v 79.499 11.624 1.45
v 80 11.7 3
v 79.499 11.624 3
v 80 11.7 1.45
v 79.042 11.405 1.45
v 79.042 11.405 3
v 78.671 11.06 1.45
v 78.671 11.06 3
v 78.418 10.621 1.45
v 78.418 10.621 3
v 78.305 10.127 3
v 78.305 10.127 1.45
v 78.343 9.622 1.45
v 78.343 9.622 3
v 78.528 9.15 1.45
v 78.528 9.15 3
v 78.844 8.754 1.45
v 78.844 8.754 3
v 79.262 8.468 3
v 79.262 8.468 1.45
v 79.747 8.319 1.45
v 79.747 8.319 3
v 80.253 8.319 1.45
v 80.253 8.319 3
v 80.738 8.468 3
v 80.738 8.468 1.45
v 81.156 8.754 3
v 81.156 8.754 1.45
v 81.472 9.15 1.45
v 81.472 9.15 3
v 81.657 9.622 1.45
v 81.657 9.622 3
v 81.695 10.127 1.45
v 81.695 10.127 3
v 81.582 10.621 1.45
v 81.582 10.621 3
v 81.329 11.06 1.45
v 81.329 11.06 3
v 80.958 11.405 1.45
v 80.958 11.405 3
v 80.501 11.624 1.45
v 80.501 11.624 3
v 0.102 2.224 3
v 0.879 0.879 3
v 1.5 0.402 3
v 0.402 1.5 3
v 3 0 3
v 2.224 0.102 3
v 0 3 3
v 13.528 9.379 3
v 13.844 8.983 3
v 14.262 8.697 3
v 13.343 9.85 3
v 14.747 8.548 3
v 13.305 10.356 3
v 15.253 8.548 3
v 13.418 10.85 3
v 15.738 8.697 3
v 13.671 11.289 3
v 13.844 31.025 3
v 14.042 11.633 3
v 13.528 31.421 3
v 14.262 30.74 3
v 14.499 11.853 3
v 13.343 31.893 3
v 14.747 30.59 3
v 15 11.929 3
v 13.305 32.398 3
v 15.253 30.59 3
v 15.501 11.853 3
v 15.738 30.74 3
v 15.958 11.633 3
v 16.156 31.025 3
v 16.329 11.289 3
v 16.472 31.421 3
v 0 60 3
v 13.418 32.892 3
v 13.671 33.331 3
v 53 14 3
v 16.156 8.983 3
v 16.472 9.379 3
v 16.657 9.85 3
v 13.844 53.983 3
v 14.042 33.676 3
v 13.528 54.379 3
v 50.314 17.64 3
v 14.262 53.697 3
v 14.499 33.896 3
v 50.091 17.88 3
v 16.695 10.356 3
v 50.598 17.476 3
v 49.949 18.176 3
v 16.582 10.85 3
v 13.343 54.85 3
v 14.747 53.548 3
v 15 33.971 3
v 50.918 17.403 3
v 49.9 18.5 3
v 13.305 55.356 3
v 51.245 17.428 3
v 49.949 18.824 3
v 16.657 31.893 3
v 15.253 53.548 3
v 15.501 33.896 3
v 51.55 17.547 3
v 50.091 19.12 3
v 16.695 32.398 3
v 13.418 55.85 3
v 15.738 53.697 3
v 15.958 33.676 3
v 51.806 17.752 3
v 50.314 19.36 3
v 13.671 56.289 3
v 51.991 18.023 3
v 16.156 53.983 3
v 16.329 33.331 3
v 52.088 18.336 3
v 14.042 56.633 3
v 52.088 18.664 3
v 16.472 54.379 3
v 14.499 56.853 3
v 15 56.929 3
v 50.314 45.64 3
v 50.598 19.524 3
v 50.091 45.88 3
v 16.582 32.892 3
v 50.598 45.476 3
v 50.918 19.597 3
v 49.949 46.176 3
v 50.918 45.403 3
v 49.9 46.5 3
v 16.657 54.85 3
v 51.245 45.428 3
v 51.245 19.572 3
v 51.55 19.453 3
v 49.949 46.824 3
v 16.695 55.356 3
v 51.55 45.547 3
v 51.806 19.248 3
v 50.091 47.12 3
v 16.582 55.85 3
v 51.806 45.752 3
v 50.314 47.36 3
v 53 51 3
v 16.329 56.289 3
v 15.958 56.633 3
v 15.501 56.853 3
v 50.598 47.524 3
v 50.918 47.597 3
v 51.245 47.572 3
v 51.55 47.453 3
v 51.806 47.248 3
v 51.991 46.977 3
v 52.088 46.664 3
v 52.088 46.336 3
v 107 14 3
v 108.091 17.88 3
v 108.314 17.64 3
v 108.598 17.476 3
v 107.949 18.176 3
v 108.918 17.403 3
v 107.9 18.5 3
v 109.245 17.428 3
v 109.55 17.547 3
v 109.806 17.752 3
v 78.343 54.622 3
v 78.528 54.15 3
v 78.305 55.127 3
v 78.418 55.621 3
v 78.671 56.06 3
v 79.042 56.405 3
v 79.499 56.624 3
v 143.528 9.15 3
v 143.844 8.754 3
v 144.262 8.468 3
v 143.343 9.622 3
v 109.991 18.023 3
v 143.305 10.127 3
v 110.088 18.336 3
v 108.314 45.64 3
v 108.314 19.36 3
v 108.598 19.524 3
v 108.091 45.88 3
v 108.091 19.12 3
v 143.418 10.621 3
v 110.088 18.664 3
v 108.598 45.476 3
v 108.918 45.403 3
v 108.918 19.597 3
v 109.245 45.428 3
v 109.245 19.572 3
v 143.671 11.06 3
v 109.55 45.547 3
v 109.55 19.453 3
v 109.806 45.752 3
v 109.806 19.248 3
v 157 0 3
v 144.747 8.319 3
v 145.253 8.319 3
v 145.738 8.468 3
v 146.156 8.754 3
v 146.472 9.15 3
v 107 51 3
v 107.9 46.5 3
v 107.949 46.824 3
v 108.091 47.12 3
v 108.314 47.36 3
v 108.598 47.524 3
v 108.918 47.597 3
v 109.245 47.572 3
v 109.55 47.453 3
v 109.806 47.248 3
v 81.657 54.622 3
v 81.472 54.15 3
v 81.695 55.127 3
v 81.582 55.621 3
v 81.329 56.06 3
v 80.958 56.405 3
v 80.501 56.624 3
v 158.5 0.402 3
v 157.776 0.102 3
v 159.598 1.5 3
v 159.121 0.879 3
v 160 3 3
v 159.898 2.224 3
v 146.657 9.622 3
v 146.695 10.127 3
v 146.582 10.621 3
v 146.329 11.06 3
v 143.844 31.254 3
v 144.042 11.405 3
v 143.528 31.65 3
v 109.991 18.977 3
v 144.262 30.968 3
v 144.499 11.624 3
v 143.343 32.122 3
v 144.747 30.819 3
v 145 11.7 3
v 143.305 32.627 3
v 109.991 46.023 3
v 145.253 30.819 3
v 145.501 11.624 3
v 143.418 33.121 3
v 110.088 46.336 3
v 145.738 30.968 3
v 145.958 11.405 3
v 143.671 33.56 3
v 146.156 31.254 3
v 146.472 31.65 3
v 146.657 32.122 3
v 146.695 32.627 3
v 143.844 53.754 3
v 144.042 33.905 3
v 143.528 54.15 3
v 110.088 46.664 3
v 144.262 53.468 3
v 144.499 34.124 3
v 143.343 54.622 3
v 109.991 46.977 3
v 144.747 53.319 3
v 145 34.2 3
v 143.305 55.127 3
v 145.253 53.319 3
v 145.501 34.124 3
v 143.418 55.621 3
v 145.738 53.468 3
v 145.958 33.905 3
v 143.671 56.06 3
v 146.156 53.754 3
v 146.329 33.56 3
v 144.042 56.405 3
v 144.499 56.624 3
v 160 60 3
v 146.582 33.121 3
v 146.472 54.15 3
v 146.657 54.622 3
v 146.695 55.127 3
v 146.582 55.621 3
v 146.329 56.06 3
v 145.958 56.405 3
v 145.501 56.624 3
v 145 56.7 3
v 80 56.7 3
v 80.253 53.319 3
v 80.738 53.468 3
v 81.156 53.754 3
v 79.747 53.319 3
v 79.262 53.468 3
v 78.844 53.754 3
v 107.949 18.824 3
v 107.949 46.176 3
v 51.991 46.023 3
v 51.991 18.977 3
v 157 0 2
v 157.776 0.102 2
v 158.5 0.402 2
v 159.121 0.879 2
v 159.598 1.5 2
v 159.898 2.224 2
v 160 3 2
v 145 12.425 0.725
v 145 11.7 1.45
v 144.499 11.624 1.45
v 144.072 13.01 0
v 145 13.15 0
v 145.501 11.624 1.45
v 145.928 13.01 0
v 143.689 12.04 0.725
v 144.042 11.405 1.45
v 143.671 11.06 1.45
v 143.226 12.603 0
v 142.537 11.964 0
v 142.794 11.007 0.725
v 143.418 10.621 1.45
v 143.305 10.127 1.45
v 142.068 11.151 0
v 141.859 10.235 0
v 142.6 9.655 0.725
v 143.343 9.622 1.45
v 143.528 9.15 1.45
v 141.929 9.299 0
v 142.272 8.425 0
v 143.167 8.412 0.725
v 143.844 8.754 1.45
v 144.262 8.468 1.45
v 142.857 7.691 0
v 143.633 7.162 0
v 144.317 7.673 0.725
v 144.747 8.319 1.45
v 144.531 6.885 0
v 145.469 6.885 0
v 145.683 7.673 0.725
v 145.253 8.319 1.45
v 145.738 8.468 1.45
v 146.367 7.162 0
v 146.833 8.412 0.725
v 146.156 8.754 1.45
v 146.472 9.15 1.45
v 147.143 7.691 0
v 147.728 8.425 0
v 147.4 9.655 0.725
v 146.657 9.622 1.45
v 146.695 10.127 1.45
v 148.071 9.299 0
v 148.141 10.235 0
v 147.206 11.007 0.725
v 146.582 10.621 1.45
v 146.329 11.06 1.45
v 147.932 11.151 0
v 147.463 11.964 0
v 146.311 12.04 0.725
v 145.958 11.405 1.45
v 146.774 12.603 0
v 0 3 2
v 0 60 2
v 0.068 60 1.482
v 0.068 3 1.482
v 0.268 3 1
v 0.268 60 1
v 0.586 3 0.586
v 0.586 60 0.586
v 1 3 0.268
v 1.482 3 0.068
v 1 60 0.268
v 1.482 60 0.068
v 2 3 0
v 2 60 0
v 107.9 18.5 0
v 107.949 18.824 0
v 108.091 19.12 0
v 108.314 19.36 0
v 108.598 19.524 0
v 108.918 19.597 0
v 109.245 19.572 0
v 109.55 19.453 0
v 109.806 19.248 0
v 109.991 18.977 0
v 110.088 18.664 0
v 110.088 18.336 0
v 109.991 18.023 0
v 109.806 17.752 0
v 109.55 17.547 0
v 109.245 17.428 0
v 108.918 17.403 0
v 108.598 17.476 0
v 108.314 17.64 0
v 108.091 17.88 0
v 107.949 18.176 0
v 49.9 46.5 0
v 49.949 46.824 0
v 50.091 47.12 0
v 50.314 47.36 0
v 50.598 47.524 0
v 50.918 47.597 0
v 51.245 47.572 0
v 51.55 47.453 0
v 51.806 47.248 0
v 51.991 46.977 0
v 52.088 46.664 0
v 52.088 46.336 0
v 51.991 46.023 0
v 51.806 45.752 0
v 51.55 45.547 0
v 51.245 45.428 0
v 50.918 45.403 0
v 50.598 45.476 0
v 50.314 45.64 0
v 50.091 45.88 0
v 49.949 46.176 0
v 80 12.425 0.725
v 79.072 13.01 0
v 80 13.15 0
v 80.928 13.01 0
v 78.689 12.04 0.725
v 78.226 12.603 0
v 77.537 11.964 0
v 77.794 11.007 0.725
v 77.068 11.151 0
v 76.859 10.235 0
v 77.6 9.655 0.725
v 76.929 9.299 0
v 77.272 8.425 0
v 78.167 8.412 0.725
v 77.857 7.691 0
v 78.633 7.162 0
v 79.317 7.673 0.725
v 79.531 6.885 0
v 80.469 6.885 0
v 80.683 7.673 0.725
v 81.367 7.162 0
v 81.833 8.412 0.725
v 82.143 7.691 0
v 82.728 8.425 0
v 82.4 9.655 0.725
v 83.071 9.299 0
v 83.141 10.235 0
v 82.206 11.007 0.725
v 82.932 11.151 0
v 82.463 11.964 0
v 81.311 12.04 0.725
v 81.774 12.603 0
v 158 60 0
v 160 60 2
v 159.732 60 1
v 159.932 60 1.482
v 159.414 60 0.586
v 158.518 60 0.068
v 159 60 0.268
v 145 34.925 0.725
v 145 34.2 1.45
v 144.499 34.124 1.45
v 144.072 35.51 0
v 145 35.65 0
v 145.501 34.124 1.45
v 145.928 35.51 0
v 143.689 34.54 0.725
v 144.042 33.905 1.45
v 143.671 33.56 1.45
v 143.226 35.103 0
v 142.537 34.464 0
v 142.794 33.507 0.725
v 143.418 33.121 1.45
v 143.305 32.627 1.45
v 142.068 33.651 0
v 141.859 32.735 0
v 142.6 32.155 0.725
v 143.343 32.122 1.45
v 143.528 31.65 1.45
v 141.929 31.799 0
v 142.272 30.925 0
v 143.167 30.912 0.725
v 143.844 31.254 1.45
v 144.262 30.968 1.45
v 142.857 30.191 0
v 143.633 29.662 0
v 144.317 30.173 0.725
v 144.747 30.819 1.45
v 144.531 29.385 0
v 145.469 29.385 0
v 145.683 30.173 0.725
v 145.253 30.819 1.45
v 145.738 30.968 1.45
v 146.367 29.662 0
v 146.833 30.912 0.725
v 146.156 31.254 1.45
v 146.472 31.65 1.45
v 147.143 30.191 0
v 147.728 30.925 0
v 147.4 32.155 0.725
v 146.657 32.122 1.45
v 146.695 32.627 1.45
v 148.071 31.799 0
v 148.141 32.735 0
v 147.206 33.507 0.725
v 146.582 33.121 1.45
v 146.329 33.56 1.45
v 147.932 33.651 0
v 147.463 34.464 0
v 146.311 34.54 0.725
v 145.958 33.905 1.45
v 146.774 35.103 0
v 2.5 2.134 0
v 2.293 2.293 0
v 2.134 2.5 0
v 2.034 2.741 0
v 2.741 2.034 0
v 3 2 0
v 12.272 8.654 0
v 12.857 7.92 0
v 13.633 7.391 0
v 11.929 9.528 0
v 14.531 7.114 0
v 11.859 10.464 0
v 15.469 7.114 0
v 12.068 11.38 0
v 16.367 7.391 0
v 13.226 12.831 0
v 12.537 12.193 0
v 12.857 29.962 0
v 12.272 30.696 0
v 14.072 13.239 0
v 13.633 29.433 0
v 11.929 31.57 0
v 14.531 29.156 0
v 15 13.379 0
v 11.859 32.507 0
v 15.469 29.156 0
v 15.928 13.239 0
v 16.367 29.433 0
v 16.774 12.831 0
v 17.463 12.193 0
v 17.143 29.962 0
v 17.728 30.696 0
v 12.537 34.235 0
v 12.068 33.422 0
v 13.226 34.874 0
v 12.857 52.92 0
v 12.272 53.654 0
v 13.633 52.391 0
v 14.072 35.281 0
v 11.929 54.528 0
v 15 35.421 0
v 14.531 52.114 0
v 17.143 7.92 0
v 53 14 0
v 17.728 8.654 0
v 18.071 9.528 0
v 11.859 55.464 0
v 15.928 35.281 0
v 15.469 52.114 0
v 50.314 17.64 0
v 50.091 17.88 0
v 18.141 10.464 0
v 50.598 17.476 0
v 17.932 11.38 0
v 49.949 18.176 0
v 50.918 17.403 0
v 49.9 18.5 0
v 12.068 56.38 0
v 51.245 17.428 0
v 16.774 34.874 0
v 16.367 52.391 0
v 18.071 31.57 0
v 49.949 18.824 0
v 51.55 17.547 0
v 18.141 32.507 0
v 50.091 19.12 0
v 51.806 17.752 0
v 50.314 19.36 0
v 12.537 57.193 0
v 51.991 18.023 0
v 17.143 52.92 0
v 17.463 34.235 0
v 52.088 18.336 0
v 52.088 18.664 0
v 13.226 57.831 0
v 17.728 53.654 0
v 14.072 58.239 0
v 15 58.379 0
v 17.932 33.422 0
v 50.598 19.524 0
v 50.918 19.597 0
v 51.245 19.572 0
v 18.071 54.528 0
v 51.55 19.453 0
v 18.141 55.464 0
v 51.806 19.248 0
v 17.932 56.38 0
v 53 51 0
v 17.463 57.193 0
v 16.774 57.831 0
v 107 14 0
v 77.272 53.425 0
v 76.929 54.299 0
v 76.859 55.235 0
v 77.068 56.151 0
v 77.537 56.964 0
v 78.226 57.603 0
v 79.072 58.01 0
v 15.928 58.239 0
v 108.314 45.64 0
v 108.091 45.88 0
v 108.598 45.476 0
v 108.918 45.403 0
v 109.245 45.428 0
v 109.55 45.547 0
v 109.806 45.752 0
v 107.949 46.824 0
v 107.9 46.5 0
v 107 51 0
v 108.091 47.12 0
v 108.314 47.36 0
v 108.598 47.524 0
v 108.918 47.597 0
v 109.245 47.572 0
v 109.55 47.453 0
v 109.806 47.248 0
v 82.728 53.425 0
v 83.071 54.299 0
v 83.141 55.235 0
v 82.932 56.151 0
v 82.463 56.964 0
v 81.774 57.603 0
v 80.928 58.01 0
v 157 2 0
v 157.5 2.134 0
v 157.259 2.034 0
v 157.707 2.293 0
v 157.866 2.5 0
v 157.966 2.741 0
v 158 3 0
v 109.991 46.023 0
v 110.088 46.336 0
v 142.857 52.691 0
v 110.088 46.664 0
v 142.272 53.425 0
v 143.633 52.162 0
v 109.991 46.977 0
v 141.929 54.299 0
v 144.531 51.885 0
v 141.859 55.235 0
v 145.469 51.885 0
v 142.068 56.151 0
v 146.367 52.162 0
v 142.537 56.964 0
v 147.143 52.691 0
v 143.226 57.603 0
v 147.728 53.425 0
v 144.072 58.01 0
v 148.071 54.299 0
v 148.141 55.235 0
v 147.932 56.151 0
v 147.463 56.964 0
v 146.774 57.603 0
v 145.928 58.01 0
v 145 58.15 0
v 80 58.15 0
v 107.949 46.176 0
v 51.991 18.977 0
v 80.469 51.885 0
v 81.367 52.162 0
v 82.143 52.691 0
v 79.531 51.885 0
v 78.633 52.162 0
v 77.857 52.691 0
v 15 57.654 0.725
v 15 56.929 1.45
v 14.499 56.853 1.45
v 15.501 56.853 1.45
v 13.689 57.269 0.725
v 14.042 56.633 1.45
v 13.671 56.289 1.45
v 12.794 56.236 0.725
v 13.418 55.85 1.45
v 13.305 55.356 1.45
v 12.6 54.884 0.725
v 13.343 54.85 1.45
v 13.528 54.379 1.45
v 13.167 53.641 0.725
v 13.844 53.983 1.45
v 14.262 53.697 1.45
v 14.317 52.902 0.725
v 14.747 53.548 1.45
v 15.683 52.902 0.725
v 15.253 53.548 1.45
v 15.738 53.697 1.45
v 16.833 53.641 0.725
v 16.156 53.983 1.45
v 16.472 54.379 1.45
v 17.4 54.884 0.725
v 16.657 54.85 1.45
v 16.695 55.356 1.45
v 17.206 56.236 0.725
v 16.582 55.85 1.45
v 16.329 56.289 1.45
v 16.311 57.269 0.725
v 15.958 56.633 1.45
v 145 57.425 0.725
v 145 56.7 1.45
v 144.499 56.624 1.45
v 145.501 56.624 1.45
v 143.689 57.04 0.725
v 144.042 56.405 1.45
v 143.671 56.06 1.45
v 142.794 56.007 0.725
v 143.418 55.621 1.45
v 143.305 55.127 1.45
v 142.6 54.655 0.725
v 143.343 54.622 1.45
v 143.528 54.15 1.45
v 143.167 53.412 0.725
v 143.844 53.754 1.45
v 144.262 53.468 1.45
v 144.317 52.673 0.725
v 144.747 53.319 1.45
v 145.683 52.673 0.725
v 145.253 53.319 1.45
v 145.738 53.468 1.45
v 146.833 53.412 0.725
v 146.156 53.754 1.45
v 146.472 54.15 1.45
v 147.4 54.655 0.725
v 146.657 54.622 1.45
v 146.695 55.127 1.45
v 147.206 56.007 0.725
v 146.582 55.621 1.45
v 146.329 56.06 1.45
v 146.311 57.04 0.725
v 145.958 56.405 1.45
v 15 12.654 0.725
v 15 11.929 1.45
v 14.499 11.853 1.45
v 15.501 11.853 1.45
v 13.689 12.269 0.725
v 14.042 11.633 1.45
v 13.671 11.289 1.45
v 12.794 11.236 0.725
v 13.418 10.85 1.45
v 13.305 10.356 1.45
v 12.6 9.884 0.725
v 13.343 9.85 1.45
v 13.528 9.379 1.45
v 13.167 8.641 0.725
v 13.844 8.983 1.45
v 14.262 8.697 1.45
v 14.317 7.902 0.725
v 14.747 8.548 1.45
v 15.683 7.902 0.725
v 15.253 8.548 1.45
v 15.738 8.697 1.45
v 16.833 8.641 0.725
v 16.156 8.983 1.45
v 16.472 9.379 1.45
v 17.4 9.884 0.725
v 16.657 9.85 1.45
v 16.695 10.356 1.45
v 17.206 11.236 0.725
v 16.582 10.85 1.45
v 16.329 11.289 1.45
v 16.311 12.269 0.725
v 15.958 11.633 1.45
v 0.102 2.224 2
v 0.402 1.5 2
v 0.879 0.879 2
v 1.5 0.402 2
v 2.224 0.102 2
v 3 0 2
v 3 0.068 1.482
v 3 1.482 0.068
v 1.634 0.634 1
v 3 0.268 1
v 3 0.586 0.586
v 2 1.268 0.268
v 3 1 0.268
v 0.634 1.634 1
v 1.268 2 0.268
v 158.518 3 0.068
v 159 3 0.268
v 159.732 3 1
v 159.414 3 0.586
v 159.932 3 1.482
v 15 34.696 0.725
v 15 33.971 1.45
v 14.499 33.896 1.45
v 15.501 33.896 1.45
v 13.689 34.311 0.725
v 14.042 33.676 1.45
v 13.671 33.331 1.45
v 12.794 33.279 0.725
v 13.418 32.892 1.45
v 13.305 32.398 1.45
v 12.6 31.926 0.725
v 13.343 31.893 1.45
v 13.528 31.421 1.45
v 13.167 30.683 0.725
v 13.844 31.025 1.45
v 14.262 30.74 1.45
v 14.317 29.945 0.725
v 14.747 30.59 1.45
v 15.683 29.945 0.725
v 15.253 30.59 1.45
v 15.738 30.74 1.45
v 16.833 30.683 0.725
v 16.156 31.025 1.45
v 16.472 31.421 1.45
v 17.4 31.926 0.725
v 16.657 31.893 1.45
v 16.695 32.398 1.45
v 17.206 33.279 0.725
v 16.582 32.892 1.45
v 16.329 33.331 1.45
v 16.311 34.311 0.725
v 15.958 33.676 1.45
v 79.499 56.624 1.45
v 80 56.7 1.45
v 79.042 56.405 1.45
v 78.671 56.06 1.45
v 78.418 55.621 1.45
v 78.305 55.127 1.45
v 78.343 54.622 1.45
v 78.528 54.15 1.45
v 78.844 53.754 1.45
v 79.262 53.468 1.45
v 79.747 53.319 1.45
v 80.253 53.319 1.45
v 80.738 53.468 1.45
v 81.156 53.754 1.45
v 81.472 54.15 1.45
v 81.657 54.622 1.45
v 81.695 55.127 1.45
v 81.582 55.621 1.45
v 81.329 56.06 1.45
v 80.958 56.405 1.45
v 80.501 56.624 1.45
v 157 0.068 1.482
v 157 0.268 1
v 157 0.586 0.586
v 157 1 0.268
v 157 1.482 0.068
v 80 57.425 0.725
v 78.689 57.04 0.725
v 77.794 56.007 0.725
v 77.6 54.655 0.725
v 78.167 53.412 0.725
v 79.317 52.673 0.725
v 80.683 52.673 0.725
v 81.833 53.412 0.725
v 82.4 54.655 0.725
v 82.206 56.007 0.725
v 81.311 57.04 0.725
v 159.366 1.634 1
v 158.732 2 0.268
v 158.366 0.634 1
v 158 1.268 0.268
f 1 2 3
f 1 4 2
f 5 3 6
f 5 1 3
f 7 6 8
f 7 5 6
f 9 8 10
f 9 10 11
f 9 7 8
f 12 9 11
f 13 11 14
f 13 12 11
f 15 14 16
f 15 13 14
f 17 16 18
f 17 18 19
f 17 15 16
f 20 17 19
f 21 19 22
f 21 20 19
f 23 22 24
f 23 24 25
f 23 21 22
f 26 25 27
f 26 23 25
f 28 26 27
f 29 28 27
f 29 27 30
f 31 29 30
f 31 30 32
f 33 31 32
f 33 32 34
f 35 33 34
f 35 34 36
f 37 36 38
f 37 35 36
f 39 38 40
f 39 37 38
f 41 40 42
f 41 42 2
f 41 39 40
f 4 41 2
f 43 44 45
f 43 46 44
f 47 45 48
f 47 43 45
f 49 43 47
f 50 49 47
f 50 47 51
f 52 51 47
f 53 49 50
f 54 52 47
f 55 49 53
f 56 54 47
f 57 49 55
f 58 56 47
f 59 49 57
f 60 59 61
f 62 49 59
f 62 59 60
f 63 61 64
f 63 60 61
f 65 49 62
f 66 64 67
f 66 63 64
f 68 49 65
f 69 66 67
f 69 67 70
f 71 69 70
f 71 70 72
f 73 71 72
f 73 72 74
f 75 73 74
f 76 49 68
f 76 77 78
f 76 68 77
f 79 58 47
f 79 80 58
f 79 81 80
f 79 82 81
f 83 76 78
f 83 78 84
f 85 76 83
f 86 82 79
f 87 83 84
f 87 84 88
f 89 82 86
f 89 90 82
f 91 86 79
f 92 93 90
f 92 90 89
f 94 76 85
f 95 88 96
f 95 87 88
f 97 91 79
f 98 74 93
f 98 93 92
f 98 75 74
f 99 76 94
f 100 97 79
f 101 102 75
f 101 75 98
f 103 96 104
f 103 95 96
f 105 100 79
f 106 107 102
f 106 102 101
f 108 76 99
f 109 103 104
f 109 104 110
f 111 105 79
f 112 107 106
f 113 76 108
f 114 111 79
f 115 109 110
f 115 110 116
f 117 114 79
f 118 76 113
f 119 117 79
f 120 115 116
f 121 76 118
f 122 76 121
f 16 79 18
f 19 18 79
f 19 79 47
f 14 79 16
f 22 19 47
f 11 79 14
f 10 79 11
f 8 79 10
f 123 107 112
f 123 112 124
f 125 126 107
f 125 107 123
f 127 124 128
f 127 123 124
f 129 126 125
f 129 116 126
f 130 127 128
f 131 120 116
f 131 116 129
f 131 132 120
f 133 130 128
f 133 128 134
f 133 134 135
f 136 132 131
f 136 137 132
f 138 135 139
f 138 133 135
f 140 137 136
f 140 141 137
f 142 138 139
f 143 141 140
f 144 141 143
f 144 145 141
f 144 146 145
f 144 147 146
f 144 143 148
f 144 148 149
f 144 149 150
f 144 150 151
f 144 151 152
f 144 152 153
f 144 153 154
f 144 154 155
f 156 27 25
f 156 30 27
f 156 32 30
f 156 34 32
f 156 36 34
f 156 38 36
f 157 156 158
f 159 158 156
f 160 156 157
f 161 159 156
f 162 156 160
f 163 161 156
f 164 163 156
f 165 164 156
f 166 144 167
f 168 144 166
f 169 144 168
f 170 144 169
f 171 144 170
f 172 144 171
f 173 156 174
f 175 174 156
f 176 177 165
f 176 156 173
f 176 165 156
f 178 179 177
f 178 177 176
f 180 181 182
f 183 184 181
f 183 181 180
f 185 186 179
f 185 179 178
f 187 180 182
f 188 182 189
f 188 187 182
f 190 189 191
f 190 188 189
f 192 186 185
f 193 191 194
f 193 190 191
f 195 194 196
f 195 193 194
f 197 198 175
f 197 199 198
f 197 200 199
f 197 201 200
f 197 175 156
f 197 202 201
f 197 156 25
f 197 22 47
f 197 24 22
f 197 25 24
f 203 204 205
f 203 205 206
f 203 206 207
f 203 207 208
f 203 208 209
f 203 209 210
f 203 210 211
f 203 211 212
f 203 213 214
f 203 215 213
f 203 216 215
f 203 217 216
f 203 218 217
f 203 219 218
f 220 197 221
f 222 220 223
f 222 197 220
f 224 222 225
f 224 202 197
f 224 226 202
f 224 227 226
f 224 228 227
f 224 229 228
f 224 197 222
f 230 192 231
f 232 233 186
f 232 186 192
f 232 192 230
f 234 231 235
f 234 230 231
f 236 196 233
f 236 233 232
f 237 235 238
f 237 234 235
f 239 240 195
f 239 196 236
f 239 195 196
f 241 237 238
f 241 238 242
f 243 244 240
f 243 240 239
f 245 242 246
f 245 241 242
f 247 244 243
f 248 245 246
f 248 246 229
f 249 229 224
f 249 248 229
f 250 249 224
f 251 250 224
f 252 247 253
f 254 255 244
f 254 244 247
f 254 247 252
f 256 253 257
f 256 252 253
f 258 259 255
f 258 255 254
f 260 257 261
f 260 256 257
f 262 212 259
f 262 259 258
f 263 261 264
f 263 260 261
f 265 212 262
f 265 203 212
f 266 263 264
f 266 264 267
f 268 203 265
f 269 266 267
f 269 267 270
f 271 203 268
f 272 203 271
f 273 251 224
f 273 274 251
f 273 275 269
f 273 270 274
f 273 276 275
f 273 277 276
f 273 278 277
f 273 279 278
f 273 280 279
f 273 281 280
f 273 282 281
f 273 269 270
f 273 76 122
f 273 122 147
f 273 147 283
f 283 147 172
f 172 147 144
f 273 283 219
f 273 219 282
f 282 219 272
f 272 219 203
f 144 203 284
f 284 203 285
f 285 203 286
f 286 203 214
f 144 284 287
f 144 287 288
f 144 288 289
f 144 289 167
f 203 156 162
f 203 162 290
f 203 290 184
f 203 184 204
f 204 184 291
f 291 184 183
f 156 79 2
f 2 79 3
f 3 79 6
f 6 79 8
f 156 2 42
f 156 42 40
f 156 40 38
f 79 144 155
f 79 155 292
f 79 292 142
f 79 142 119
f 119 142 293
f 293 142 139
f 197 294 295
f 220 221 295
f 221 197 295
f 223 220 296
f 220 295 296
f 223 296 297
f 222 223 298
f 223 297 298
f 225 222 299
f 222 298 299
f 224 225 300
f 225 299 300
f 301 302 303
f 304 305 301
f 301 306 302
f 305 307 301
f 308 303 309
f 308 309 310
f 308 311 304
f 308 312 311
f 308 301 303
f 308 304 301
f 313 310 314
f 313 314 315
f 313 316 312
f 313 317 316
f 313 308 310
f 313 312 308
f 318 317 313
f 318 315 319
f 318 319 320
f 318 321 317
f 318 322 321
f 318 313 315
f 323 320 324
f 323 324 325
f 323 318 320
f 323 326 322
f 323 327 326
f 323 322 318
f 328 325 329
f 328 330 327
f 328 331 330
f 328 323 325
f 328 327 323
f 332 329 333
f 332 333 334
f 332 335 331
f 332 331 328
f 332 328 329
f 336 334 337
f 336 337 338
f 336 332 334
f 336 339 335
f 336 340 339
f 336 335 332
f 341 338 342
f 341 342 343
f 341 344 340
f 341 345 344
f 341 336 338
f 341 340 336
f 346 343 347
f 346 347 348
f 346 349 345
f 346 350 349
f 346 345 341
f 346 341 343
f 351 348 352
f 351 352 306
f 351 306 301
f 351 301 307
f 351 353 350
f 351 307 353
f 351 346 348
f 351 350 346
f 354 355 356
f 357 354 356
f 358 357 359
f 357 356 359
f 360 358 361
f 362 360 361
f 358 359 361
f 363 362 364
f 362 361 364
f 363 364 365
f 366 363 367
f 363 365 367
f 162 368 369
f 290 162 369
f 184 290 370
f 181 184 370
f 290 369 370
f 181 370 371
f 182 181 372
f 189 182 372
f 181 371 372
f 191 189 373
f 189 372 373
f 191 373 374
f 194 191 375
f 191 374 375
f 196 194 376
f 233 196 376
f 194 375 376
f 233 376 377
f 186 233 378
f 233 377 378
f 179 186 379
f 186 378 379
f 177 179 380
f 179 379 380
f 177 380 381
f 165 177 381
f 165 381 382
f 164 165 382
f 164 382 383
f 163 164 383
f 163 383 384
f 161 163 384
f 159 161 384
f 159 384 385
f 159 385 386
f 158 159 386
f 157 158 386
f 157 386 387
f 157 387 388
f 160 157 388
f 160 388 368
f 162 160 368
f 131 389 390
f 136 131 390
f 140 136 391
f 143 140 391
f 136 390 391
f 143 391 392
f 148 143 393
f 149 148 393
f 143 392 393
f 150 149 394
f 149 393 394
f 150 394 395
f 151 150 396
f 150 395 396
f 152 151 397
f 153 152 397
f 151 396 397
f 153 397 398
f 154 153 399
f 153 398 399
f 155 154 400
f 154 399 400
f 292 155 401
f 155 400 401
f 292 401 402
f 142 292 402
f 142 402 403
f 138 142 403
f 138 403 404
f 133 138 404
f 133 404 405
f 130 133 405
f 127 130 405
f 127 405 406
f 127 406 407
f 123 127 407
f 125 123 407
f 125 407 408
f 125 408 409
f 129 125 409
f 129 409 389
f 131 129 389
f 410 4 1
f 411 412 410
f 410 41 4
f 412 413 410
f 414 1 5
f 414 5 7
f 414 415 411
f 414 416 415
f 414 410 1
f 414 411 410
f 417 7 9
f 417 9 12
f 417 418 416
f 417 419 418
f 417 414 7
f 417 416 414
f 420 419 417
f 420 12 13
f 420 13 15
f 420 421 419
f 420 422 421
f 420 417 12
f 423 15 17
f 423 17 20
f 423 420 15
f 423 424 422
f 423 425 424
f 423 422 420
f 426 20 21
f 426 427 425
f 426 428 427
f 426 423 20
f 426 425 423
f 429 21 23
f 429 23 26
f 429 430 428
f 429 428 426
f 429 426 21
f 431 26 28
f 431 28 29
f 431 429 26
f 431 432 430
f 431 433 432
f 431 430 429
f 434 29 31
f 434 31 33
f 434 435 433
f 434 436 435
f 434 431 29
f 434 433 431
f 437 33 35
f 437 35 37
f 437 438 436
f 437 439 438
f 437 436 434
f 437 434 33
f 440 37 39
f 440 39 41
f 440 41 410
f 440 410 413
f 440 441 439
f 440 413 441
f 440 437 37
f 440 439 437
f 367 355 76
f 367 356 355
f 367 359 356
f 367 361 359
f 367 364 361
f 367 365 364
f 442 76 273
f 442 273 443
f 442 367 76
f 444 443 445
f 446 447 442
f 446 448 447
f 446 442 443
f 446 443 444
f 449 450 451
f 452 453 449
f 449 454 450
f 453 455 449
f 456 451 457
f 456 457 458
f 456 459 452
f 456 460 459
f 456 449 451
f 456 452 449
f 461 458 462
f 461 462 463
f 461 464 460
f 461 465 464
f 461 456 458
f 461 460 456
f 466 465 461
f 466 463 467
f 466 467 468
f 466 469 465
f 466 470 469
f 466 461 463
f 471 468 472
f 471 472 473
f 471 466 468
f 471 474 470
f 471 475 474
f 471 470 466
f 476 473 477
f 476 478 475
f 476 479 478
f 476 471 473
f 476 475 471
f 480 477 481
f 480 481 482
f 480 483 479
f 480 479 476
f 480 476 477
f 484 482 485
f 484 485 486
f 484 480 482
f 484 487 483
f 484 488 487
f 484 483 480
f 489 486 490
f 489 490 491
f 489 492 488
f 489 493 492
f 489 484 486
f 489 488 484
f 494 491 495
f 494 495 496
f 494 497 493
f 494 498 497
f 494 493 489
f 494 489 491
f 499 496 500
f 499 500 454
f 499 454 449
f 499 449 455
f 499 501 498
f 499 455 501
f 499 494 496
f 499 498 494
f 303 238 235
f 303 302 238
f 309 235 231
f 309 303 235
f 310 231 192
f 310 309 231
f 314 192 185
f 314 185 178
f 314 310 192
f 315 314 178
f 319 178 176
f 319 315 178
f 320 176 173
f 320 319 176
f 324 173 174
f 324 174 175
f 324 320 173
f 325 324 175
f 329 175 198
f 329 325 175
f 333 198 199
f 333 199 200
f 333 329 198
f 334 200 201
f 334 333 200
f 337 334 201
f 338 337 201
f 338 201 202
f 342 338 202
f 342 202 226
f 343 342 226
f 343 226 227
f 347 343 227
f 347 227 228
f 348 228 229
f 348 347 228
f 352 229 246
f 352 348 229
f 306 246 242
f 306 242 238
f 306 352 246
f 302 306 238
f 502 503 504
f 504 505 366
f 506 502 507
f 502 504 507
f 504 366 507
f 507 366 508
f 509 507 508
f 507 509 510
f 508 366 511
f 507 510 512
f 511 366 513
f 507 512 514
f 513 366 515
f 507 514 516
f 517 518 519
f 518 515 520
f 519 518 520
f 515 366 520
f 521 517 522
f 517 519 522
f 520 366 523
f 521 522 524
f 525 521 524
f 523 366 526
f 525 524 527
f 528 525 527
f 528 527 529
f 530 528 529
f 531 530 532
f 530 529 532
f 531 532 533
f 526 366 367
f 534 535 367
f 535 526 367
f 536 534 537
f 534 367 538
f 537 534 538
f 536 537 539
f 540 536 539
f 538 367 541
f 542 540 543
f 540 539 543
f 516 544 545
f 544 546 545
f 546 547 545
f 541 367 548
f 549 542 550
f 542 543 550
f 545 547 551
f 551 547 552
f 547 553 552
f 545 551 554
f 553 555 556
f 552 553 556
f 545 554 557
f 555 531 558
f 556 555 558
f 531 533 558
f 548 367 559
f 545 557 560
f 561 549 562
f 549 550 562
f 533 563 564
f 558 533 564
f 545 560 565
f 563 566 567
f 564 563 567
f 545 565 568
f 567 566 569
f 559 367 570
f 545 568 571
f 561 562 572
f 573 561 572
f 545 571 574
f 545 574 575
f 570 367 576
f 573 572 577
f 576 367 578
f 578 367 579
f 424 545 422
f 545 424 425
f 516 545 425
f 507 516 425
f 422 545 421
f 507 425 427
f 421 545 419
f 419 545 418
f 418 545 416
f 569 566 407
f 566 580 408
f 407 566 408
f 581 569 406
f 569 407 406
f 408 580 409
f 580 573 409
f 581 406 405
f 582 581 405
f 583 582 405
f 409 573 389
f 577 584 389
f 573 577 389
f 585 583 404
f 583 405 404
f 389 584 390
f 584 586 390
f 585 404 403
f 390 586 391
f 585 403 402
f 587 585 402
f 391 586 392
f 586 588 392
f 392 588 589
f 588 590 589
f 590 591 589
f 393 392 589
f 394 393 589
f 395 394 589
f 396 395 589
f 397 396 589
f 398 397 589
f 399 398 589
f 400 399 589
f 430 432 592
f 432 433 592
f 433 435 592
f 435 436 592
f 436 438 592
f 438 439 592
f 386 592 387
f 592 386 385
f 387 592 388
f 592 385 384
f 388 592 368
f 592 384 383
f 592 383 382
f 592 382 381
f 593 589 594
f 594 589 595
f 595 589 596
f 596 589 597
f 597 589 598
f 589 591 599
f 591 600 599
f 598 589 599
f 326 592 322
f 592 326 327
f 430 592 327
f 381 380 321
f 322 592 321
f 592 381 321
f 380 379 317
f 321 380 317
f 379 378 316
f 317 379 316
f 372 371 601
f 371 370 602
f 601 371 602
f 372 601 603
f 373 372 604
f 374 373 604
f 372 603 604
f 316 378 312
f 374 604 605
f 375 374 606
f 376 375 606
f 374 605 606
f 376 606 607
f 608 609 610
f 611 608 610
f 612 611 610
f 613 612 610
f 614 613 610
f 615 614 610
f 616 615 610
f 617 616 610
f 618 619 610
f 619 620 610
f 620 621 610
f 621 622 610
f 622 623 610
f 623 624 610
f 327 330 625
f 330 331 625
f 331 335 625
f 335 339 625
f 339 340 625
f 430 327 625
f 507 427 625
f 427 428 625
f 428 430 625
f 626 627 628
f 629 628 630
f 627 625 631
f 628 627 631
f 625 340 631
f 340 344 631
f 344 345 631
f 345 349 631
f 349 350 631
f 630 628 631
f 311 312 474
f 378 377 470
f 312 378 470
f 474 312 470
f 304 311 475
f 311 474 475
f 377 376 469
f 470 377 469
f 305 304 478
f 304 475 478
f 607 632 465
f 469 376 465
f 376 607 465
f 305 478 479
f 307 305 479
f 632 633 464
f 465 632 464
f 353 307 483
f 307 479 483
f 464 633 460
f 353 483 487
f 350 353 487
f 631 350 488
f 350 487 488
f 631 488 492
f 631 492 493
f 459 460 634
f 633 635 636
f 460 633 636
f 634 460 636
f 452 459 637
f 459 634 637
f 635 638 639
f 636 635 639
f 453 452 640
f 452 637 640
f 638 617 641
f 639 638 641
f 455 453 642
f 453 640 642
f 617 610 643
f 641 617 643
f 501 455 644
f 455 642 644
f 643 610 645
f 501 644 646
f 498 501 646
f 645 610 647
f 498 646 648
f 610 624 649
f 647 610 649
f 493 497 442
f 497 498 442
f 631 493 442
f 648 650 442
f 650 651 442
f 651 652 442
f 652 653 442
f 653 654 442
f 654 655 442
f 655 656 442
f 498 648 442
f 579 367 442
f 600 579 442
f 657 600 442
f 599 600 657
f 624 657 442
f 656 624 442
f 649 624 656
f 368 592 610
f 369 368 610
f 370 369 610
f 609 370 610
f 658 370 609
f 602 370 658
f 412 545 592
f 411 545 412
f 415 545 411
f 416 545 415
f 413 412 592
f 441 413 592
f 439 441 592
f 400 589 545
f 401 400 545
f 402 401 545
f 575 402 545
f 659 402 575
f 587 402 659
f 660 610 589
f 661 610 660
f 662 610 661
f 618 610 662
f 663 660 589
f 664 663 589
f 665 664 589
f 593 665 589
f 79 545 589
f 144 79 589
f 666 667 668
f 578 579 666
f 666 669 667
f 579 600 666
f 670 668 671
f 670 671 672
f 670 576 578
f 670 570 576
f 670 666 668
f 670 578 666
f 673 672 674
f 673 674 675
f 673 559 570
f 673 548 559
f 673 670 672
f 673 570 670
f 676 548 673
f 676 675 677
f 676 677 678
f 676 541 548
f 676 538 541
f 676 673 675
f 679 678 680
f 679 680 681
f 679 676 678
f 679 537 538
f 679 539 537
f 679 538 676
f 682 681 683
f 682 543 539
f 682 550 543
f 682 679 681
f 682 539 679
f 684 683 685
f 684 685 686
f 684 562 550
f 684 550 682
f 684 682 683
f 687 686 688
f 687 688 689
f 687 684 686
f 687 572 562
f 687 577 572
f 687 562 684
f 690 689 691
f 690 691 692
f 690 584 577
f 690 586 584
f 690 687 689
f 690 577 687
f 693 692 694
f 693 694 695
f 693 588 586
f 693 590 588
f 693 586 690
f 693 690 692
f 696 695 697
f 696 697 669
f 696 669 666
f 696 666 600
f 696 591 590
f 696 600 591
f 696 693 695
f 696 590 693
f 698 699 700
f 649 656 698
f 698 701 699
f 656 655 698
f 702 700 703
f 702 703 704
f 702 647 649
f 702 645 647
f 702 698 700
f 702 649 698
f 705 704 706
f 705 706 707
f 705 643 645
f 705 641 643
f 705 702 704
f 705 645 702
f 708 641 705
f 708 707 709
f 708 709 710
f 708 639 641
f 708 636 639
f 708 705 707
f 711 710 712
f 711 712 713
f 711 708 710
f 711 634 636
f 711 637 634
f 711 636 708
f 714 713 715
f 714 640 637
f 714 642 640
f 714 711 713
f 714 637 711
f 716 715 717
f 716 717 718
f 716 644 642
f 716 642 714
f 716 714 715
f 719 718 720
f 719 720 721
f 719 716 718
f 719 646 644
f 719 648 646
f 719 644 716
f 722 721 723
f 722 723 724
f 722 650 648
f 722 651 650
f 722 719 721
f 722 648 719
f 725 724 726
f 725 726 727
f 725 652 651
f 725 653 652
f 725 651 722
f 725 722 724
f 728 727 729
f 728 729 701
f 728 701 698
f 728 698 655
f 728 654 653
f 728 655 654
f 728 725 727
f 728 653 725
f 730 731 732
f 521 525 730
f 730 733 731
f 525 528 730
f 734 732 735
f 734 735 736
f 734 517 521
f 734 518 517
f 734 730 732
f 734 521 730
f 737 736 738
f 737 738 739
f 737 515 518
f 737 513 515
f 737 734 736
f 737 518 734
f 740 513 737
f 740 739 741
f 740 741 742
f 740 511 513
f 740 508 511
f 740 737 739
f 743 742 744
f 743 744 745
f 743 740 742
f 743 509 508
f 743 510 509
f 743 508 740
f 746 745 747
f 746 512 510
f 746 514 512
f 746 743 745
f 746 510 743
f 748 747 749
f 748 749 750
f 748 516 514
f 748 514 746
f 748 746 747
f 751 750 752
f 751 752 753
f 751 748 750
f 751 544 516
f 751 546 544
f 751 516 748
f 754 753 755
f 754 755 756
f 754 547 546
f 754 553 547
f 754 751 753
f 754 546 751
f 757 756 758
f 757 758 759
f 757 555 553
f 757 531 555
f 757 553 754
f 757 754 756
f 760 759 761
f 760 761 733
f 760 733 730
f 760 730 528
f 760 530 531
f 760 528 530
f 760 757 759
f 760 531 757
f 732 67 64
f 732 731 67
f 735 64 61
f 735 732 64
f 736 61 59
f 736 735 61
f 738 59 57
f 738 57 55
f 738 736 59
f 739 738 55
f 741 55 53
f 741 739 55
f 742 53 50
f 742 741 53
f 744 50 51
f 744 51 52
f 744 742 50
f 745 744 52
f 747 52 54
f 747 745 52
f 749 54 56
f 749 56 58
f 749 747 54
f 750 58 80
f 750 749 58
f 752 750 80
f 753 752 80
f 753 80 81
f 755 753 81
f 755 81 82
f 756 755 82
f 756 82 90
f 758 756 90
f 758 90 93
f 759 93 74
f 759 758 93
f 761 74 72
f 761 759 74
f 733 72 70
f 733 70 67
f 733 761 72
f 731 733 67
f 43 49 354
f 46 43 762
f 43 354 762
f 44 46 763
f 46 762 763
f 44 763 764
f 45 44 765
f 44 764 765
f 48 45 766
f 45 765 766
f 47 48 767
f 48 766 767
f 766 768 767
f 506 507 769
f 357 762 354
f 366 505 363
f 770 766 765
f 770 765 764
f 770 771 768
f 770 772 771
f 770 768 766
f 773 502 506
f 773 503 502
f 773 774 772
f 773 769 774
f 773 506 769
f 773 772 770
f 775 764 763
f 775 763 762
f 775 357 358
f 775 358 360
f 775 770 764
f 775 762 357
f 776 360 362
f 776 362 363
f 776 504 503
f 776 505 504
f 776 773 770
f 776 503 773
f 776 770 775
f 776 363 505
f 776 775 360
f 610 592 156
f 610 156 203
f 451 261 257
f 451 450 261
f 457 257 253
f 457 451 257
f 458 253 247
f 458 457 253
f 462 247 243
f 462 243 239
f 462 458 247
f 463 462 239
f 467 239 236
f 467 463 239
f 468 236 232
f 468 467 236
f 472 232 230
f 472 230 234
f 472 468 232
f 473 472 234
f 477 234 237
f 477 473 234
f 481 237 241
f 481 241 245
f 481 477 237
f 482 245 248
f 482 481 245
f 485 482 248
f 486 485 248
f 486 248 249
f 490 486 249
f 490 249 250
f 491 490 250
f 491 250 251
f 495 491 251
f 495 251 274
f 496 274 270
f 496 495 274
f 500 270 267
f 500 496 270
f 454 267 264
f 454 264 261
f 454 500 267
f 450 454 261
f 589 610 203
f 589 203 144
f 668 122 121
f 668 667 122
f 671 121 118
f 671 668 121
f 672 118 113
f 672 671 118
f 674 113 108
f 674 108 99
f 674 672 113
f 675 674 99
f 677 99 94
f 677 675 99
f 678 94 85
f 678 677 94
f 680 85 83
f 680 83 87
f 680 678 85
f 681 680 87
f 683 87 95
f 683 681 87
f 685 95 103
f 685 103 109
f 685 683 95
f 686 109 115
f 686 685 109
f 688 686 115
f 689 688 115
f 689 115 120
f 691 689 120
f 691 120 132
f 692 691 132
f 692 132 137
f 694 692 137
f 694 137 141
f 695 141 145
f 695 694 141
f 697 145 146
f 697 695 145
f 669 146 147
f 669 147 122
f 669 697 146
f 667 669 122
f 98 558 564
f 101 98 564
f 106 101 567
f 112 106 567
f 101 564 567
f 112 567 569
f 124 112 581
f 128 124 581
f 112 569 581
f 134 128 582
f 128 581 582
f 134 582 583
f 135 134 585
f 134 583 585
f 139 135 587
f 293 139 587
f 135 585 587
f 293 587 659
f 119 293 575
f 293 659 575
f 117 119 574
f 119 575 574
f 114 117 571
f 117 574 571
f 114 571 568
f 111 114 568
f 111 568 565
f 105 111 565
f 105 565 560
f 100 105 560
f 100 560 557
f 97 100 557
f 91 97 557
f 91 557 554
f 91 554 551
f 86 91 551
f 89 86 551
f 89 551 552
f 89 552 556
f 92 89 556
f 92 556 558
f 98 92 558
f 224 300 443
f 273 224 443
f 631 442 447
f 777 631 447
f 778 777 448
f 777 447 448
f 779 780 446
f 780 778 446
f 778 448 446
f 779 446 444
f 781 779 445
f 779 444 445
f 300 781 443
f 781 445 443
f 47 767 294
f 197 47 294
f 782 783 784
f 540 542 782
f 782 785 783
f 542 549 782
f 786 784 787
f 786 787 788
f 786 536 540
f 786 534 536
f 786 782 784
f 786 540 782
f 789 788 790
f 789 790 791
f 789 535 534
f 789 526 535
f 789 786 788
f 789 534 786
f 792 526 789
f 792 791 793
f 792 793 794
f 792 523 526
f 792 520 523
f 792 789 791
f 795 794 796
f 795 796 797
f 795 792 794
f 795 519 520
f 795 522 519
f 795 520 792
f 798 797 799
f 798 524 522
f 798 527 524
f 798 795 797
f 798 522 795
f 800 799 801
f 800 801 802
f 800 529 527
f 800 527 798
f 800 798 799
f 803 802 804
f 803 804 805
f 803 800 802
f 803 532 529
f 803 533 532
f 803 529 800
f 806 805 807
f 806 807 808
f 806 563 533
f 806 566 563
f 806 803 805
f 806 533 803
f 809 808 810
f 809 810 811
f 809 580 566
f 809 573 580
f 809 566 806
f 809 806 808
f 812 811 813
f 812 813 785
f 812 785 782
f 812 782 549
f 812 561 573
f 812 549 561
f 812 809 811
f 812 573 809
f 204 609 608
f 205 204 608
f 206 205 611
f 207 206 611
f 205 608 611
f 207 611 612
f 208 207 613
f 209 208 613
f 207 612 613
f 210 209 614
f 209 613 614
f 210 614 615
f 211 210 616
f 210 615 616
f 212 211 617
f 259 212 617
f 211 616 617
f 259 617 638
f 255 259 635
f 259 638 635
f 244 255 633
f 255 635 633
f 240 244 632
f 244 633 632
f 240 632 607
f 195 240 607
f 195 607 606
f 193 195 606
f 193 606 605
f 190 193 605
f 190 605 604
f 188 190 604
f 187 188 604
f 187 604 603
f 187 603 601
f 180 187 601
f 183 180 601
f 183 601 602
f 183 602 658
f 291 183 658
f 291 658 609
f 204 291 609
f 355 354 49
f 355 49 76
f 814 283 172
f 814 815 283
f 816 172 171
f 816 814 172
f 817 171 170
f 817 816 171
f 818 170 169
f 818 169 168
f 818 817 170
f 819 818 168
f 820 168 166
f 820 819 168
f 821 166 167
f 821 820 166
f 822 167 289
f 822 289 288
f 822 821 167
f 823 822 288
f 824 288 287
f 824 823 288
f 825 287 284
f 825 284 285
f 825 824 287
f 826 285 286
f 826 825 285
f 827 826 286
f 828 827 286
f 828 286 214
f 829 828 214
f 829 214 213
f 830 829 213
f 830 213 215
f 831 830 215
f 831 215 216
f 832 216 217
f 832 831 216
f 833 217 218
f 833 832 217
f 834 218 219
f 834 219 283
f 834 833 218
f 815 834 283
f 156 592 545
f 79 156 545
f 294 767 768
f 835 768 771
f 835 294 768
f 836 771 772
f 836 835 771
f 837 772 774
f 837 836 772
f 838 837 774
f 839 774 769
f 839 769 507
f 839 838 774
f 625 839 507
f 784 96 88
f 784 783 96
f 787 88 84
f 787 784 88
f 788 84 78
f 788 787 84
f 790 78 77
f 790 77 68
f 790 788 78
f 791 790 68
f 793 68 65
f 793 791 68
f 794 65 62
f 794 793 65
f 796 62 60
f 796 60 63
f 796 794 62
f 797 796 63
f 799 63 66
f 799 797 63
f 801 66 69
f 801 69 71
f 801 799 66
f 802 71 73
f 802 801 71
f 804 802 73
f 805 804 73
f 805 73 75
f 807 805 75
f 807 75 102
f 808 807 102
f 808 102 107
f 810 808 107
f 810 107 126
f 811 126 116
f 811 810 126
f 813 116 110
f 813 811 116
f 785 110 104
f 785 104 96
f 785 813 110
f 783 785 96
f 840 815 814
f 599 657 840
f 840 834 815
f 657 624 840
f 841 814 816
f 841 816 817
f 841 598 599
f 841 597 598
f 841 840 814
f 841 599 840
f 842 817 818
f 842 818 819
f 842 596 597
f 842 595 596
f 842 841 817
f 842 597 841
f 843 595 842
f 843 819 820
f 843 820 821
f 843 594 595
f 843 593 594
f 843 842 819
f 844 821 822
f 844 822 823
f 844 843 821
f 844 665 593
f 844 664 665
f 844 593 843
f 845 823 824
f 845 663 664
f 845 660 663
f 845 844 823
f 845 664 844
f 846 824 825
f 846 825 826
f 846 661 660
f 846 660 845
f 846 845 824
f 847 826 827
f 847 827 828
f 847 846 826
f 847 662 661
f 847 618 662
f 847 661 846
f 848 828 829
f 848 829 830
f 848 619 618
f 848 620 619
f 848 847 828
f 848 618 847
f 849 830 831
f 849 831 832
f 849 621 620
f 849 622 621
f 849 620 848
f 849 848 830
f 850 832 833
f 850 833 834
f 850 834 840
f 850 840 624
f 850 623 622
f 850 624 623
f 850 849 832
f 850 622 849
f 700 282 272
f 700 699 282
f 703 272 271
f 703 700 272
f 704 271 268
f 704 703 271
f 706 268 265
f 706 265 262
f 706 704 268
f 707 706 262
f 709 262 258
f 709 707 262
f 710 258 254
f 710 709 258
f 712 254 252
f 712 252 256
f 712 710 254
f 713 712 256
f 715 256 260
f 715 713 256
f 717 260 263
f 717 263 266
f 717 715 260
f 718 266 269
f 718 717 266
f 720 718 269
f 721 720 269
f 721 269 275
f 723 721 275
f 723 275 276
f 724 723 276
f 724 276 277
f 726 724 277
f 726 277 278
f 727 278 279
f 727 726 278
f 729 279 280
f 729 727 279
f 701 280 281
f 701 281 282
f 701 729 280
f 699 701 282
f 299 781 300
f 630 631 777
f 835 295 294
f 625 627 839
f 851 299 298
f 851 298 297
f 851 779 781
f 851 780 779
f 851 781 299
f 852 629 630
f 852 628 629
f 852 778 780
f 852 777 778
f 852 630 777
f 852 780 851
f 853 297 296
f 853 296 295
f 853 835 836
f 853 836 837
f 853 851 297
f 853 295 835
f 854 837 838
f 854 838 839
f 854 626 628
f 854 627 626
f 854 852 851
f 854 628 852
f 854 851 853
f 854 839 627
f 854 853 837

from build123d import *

# Parameters (mm, degrees)
SKETCH1_W                                      = 160
SKETCH1_H                                      = 60
BOSS_EXTRUDE1_DEPTH                            = 3
SKETCH2_R                                      = 1.1
SKETCH2_W                                      = 54
SKETCH2_H                                      = 37
CUT_EXTRUDE1_DEPTH                             = 171.906407136
FILLET1_R                                      = 2
FILLET2_R                                      = 3
CSK_FOR_M3_FLAT_HEAD_MACHINE_SCREW1_AT_2_COUNT = 2
CSK_FOR_M3_FLAT_HEAD_MACHINE_SCREW1_AT_2_PITCH = 22.5
CSK_FOR_M3_FLAT_HEAD_MACHINE_SCREW1_AT_3_COUNT = 2
CSK_FOR_M3_FLAT_HEAD_MACHINE_SCREW1_AT_3_PITCH = 45
CSK_FOR_M3_FLAT_HEAD_MACHINE_SCREW1_AT_4_COUNT = 2
CSK_FOR_M3_FLAT_HEAD_MACHINE_SCREW1_AT_4_PITCH = 79.056941504
CSK_FOR_M3_FLAT_HEAD_MACHINE_SCREW1_AT_5_COUNT = 2
CSK_FOR_M3_FLAT_HEAD_MACHINE_SCREW1_AT_5_PITCH = 65
CSK_FOR_M3_FLAT_HEAD_MACHINE_SCREW1_AT_6_COUNT = 2
CSK_FOR_M3_FLAT_HEAD_MACHINE_SCREW1_AT_6_PITCH = 130.000201211
CSK_FOR_M3_FLAT_HEAD_MACHINE_SCREW1_AT_7_COUNT = 2
CSK_FOR_M3_FLAT_HEAD_MACHINE_SCREW1_AT_7_PITCH = 131.97194743
CSK_FOR_M3_FLAT_HEAD_MACHINE_SCREW1_AT_8_COUNT = 2
CSK_FOR_M3_FLAT_HEAD_MACHINE_SCREW1_AT_8_PITCH = 137.493516675


with BuildPart() as part:
    # Sketch1 → Boss-Extrude1 (new body)
    with BuildSketch(Plane.XY):
        with Locations((80, 30)):
            Rectangle(SKETCH1_W, SKETCH1_H)
    extrude(amount=BOSS_EXTRUDE1_DEPTH)

    # Sketch2 → Cut-Extrude1 (cut, through all)
    with BuildSketch(Plane(origin=(0, 0, 0), x_dir=(-1, 0, 0), z_dir=(0, 0, -1))):
        with Locations((-109, 46.5)):
            Circle(SKETCH2_R)
        with Locations((-109, 18.5)):
            Circle(SKETCH2_R)
        with Locations((-51, 18.5)):
            Circle(SKETCH2_R)
        with Locations((-51, 46.5)):
            Circle(SKETCH2_R)
        with Locations((-80, 32.5)):
            Rectangle(SKETCH2_W, SKETCH2_H)
    extrude(amount=-CUT_EXTRUDE1_DEPTH, mode=Mode.SUBTRACT)

    # Fillet1
    fillet1_edges = [part.edges().sort_by_distance(p)[0] for p in [
        (160, 30, 0),
        (80, 0, 0),
        (0, 30, 0),
    ]]
    fillet(fillet1_edges, radius=FILLET1_R)

    # Fillet2
    # the kernel refuses this fillet: 3 mm, written as the material it takes off along each edge
    with BuildSketch(Plane(origin=(3, 3, 0), x_dir=(0, -1, 0), z_dir=(1, 0, 0))) as fillet2_piece_1:
        with BuildLine():
            CenterArc((1, -2), 2, 0, 90)
            Line((3, -2), (3, 0))
            Line((3, 0), (1, 0))
        make_face()
    revolve(axis=Axis((3, 3, 0), (0, 0, -1)), revolution_arc=90, mode=Mode.SUBTRACT)
    with BuildSketch(Plane(origin=(157, 3, 0), x_dir=(1, 0, 0), z_dir=(0, 1, 0))) as fillet2_piece_2:
        with BuildLine():
            CenterArc((1, -2), 2, 0, 90)
            Line((3, -2), (3, 0))
            Line((3, 0), (1, 0))
        make_face()
    revolve(axis=Axis((157, 3, 0), (0, 0, -1)), revolution_arc=90, mode=Mode.SUBTRACT)
    with BuildSketch(Plane(origin=(160, 0, 0), x_dir=(-1, 0, 0), z_dir=(0, 0, 1))) as fillet2_piece_3:
        with BuildLine():
            CenterArc((FILLET2_R, -FILLET2_R), FILLET2_R, 90, 90)
            Line((0, -FILLET2_R), (0, 0))
            Line((0, 0), (FILLET2_R, 0))
        make_face()
    extrude(amount=10.5, mode=Mode.SUBTRACT)
    with BuildSketch(Plane(origin=(0, 0, 0), x_dir=(1, 0, 0), z_dir=(0, 0, 1))) as fillet2_piece_4:
        with BuildLine():
            CenterArc((FILLET2_R, FILLET2_R), FILLET2_R, 180, 90)
            Line((0, FILLET2_R), (0, 0))
            Line((0, 0), (FILLET2_R, 0))
        make_face()
    extrude(amount=10.5, mode=Mode.SUBTRACT)

    # Sketch5 → CSK for M3 Flat Head Machine Screw1 (revolve, cut)
    with BuildSketch(Plane(origin=(145, 55, 0), x_dir=(0, 1, 0), z_dir=(1, 0, 0))):
        Polygon((0, 0), (0, 3), (1.7, 3), (1.7, 1.45), (3.15, 0), align=None)
    csk_for_m3_flat_head_machine_screw1 = revolve(axis=Axis((145, 55, -6.35), (0, 0, 1)), mode=Mode.SUBTRACT)

    # CSK for M3 Flat Head Machine Screw1 at 2: CSK for M3 Flat Head Machine Screw1 ×2
    with Locations(*[(0, -i * CSK_FOR_M3_FLAT_HEAD_MACHINE_SCREW1_AT_2_PITCH, 0) for i in range(1, CSK_FOR_M3_FLAT_HEAD_MACHINE_SCREW1_AT_2_COUNT)]):
        add(csk_for_m3_flat_head_machine_screw1, mode=Mode.SUBTRACT)

    # CSK for M3 Flat Head Machine Screw1 at 3: CSK for M3 Flat Head Machine Screw1 ×2
    with Locations(*[(0, -i * CSK_FOR_M3_FLAT_HEAD_MACHINE_SCREW1_AT_3_PITCH, 0) for i in range(1, CSK_FOR_M3_FLAT_HEAD_MACHINE_SCREW1_AT_3_COUNT)]):
        add(csk_for_m3_flat_head_machine_screw1, mode=Mode.SUBTRACT)

    # CSK for M3 Flat Head Machine Screw1 at 4: CSK for M3 Flat Head Machine Screw1 ×2
    with Locations(*[Vector(-0.8221921916437787, -0.5692099788303083, 0) * (i * CSK_FOR_M3_FLAT_HEAD_MACHINE_SCREW1_AT_4_PITCH) for i in range(1, CSK_FOR_M3_FLAT_HEAD_MACHINE_SCREW1_AT_4_COUNT)]):
        add(csk_for_m3_flat_head_machine_screw1, mode=Mode.SUBTRACT)

    # CSK for M3 Flat Head Machine Screw1 at 5: CSK for M3 Flat Head Machine Screw1 ×2
    with Locations(*[(-i * CSK_FOR_M3_FLAT_HEAD_MACHINE_SCREW1_AT_5_PITCH, 0, 0) for i in range(1, CSK_FOR_M3_FLAT_HEAD_MACHINE_SCREW1_AT_5_COUNT)]):
        add(csk_for_m3_flat_head_machine_screw1, mode=Mode.SUBTRACT)

    # CSK for M3 Flat Head Machine Screw1 at 6: CSK for M3 Flat Head Machine Screw1 ×2
    with Locations(*[Vector(-0.9999984522282437, 0.0017594149928170457, 0) * (i * CSK_FOR_M3_FLAT_HEAD_MACHINE_SCREW1_AT_6_PITCH) for i in range(1, CSK_FOR_M3_FLAT_HEAD_MACHINE_SCREW1_AT_6_COUNT)]):
        add(csk_for_m3_flat_head_machine_screw1, mode=Mode.SUBTRACT)

    # CSK for M3 Flat Head Machine Screw1 at 7: CSK for M3 Flat Head Machine Screw1 ×2
    with Locations(*[Vector(-0.9850578288164882, -0.17222390625968964, 0) * (i * CSK_FOR_M3_FLAT_HEAD_MACHINE_SCREW1_AT_7_PITCH) for i in range(1, CSK_FOR_M3_FLAT_HEAD_MACHINE_SCREW1_AT_7_COUNT)]):
        add(csk_for_m3_flat_head_machine_screw1, mode=Mode.SUBTRACT)

    # CSK for M3 Flat Head Machine Screw1 at 8: CSK for M3 Flat Head Machine Screw1 ×2
    with Locations(*[Vector(-0.9454991271168818, -0.3256246314719061, 0) * (i * CSK_FOR_M3_FLAT_HEAD_MACHINE_SCREW1_AT_8_PITCH) for i in range(1, CSK_FOR_M3_FLAT_HEAD_MACHINE_SCREW1_AT_8_COUNT)]):
        add(csk_for_m3_flat_head_machine_screw1, mode=Mode.SUBTRACT)


solid = part.part
